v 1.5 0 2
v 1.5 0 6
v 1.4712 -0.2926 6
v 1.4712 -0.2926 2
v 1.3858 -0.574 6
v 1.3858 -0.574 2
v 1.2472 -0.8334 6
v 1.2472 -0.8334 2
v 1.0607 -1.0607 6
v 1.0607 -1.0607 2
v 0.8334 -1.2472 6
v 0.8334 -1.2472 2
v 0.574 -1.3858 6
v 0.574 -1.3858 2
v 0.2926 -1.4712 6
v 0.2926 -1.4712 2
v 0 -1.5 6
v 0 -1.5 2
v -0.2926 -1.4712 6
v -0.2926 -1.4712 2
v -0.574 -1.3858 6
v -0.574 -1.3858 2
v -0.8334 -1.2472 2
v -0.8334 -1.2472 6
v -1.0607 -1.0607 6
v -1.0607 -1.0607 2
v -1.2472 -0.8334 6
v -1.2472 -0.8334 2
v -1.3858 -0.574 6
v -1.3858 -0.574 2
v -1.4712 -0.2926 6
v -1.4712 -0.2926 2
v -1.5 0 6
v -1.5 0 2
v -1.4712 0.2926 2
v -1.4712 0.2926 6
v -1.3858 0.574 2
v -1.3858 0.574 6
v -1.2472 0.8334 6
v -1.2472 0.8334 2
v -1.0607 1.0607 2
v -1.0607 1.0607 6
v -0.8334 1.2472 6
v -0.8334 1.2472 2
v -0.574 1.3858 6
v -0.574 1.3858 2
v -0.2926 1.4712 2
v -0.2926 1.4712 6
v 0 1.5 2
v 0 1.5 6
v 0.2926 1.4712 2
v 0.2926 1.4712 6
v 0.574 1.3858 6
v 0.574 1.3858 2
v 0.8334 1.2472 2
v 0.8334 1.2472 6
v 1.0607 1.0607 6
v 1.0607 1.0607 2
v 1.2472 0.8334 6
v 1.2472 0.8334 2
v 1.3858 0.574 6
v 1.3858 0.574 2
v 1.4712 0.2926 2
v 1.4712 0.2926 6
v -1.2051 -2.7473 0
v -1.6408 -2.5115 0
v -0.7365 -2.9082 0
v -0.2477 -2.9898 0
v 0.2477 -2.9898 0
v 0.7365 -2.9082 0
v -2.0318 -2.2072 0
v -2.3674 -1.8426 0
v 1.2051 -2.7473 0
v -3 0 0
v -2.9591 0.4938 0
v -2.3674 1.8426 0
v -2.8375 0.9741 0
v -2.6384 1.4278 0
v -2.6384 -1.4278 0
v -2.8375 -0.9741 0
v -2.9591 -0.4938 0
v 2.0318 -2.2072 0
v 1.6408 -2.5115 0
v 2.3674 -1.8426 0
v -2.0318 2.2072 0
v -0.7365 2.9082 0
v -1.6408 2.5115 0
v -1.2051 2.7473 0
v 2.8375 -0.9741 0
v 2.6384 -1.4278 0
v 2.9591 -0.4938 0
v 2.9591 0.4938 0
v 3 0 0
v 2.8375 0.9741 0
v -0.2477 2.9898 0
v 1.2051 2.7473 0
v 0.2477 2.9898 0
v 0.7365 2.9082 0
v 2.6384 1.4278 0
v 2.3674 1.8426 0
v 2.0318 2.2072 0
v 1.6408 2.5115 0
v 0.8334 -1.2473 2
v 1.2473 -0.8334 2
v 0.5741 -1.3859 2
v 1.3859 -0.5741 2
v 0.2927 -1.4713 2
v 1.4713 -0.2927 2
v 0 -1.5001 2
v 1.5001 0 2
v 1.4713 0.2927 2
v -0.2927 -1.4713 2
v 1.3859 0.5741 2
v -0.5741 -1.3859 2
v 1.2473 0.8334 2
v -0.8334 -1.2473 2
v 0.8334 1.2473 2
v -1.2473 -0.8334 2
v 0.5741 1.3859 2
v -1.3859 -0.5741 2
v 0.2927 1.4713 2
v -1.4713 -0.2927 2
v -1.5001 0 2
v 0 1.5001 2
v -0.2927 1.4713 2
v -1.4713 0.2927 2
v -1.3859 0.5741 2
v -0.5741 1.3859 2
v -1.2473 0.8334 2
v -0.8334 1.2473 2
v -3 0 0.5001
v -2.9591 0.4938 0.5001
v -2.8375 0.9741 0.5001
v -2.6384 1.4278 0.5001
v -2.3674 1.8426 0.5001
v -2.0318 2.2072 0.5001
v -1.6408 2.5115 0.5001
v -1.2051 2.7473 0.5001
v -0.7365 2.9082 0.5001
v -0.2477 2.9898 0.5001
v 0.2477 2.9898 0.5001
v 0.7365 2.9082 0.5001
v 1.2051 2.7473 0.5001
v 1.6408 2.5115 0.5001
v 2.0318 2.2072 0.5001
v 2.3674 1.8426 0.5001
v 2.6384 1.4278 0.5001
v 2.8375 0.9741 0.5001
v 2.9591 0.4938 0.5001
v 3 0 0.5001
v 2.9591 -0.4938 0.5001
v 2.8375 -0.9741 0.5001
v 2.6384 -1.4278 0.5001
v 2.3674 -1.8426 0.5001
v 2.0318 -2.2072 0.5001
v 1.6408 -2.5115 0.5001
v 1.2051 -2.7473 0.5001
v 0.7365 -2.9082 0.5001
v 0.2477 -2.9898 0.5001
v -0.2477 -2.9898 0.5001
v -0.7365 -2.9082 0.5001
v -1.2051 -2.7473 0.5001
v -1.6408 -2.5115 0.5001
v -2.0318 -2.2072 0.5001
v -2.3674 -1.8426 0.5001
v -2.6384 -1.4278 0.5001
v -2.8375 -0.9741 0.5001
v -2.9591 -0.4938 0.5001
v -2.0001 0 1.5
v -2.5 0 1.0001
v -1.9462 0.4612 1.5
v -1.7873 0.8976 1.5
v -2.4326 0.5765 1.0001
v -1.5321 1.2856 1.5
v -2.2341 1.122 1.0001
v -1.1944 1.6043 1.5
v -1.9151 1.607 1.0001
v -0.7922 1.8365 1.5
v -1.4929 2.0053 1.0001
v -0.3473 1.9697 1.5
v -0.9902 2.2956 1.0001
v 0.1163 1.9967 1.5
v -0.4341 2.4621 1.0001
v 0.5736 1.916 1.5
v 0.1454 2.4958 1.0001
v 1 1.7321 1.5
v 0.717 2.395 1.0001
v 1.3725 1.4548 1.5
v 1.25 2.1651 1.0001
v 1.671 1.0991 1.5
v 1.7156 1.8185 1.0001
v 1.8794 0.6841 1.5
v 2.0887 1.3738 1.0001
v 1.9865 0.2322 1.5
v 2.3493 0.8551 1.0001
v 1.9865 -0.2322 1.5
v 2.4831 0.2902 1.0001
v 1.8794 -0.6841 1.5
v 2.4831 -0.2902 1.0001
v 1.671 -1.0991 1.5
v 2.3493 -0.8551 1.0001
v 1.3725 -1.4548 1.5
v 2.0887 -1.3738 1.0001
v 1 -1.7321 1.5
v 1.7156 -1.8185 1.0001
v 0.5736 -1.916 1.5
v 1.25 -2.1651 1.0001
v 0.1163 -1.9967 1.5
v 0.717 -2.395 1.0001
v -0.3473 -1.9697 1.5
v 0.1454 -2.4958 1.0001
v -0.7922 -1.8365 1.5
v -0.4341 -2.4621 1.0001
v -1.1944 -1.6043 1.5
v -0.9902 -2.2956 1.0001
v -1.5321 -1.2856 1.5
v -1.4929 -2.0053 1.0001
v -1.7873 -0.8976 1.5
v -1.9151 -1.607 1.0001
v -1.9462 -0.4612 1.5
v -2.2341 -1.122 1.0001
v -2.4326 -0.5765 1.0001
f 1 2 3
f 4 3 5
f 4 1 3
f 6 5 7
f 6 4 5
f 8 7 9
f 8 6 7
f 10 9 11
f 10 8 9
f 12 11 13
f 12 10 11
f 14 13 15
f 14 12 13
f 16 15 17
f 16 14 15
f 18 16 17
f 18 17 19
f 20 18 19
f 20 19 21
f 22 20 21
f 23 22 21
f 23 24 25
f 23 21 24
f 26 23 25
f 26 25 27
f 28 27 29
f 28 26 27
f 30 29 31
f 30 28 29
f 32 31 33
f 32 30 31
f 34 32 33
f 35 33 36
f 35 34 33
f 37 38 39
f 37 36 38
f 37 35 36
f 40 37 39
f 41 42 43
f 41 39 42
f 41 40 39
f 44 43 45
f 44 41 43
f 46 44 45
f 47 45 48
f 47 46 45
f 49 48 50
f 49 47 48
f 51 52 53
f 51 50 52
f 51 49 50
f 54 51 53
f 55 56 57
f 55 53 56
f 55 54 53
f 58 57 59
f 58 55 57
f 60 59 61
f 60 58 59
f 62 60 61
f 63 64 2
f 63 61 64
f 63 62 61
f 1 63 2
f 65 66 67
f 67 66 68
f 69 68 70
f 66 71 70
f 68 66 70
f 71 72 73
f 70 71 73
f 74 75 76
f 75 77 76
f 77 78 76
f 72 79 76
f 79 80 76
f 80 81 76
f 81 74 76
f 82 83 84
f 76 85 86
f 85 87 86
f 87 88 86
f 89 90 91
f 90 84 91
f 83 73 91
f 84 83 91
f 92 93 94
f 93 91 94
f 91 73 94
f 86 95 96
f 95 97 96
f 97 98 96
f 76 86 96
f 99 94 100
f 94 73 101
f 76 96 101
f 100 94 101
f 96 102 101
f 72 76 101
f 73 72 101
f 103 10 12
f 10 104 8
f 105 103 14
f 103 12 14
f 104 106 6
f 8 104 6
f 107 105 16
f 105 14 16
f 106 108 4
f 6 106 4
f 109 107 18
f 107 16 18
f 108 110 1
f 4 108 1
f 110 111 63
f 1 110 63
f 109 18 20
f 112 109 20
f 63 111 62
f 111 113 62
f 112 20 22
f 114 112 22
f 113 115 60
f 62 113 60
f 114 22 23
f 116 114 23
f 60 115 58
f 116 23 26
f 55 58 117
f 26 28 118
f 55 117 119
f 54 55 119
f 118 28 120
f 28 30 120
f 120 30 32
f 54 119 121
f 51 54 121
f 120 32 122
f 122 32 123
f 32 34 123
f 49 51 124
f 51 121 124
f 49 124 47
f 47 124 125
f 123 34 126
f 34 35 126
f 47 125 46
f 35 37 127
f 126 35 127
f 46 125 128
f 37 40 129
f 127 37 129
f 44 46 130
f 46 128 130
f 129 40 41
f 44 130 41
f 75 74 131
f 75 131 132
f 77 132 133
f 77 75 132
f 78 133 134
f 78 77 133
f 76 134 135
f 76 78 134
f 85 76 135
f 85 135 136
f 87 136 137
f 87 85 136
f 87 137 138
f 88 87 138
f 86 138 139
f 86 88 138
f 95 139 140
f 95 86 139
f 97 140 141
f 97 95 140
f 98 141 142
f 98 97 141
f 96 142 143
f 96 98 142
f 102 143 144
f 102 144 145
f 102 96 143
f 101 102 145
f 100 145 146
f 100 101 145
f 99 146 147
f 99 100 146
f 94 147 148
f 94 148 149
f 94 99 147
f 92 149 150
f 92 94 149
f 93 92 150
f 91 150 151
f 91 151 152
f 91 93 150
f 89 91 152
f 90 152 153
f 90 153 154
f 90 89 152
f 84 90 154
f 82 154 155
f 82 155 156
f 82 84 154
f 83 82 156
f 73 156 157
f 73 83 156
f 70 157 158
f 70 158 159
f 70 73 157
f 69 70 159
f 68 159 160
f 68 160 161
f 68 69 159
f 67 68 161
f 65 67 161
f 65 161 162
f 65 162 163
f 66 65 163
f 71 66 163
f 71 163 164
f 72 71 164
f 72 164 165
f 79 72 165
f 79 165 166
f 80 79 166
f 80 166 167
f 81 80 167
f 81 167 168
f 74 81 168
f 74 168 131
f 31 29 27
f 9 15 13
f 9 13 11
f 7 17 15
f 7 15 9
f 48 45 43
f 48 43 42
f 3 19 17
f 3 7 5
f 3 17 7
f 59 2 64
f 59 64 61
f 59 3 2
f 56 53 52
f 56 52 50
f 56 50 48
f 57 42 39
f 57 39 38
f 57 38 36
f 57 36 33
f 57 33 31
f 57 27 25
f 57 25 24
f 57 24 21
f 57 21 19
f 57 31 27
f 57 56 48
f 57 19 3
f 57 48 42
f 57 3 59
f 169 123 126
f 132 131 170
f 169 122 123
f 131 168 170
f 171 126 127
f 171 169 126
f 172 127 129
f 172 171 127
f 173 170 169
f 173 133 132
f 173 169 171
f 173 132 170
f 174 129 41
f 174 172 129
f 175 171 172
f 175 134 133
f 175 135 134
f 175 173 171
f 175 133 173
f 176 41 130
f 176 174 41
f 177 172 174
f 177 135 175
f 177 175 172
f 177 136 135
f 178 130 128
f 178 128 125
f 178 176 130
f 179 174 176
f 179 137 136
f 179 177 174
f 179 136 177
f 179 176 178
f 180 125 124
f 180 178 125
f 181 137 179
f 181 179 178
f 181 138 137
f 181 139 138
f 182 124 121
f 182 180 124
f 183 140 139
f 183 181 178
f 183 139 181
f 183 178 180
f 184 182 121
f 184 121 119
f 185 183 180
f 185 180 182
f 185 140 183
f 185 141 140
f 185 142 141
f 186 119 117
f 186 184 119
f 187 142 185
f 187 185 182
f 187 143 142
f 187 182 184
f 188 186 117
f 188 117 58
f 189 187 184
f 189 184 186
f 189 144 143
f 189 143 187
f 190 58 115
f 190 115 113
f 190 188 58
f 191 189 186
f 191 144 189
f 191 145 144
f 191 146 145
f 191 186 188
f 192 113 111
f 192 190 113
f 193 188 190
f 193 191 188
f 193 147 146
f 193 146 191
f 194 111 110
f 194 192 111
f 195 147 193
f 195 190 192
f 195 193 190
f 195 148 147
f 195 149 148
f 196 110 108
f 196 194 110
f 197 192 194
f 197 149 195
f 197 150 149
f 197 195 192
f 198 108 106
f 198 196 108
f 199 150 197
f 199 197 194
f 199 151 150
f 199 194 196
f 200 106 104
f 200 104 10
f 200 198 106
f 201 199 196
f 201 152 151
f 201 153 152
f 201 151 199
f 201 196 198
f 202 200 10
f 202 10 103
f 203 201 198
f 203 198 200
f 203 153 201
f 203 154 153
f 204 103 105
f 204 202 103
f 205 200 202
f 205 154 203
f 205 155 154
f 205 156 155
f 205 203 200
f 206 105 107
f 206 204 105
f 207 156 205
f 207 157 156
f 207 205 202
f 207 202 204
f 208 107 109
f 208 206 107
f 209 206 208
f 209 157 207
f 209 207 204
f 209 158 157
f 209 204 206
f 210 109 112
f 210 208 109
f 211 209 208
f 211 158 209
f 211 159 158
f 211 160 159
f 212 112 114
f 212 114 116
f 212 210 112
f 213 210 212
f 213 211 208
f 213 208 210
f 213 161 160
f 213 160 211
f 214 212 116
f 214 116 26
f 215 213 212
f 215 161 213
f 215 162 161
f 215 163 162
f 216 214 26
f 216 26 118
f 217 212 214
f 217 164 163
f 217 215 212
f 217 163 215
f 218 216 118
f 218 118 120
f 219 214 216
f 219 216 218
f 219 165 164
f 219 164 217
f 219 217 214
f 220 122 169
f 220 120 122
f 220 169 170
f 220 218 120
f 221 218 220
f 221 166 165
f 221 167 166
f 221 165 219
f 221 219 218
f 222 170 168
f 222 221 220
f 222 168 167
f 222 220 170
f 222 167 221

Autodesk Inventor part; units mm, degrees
ref_plane "YZ Plane" through (0, 0, 0) normal (1, 0, 0) x (0, 1, 0)
ref_plane "XZ Plane" through (0, 0, 0) normal (0, 1, 0) x (-1, 0, 0)
ref_plane "XY Plane" through (0, 0, 0) normal (0, 0, 1) x (1, 0, 0)
sketch "スケッチ1" plane through (0, 0, 0) normal (0, 0, 1) x (1, 0, 0)
  circle A0 centre (0, 0) radius 1.5
  dimension "d0" = 3
extrude "押し出し1" add sketch "スケッチ1" along normal blind 6
sketch "スケッチ2" plane through (0, 0, 0) normal (0, 0, -1) x (-1, 0, 0)
  circle A0 centre (0, 0) radius 3
  dimension "d3" = 6
extrude "押し出し2" add sketch "スケッチ2" against normal blind 2
thread "ねじ1" size "M3x0.5" class "6g" standard "ANSI Metric M Profile" full length
chamfer "面取り1" distance 1.5 angle 45 1 edges at (3, 0, 2)
properties part number "ネジ皿m3,06" material "鋼、高強度、低合金"
